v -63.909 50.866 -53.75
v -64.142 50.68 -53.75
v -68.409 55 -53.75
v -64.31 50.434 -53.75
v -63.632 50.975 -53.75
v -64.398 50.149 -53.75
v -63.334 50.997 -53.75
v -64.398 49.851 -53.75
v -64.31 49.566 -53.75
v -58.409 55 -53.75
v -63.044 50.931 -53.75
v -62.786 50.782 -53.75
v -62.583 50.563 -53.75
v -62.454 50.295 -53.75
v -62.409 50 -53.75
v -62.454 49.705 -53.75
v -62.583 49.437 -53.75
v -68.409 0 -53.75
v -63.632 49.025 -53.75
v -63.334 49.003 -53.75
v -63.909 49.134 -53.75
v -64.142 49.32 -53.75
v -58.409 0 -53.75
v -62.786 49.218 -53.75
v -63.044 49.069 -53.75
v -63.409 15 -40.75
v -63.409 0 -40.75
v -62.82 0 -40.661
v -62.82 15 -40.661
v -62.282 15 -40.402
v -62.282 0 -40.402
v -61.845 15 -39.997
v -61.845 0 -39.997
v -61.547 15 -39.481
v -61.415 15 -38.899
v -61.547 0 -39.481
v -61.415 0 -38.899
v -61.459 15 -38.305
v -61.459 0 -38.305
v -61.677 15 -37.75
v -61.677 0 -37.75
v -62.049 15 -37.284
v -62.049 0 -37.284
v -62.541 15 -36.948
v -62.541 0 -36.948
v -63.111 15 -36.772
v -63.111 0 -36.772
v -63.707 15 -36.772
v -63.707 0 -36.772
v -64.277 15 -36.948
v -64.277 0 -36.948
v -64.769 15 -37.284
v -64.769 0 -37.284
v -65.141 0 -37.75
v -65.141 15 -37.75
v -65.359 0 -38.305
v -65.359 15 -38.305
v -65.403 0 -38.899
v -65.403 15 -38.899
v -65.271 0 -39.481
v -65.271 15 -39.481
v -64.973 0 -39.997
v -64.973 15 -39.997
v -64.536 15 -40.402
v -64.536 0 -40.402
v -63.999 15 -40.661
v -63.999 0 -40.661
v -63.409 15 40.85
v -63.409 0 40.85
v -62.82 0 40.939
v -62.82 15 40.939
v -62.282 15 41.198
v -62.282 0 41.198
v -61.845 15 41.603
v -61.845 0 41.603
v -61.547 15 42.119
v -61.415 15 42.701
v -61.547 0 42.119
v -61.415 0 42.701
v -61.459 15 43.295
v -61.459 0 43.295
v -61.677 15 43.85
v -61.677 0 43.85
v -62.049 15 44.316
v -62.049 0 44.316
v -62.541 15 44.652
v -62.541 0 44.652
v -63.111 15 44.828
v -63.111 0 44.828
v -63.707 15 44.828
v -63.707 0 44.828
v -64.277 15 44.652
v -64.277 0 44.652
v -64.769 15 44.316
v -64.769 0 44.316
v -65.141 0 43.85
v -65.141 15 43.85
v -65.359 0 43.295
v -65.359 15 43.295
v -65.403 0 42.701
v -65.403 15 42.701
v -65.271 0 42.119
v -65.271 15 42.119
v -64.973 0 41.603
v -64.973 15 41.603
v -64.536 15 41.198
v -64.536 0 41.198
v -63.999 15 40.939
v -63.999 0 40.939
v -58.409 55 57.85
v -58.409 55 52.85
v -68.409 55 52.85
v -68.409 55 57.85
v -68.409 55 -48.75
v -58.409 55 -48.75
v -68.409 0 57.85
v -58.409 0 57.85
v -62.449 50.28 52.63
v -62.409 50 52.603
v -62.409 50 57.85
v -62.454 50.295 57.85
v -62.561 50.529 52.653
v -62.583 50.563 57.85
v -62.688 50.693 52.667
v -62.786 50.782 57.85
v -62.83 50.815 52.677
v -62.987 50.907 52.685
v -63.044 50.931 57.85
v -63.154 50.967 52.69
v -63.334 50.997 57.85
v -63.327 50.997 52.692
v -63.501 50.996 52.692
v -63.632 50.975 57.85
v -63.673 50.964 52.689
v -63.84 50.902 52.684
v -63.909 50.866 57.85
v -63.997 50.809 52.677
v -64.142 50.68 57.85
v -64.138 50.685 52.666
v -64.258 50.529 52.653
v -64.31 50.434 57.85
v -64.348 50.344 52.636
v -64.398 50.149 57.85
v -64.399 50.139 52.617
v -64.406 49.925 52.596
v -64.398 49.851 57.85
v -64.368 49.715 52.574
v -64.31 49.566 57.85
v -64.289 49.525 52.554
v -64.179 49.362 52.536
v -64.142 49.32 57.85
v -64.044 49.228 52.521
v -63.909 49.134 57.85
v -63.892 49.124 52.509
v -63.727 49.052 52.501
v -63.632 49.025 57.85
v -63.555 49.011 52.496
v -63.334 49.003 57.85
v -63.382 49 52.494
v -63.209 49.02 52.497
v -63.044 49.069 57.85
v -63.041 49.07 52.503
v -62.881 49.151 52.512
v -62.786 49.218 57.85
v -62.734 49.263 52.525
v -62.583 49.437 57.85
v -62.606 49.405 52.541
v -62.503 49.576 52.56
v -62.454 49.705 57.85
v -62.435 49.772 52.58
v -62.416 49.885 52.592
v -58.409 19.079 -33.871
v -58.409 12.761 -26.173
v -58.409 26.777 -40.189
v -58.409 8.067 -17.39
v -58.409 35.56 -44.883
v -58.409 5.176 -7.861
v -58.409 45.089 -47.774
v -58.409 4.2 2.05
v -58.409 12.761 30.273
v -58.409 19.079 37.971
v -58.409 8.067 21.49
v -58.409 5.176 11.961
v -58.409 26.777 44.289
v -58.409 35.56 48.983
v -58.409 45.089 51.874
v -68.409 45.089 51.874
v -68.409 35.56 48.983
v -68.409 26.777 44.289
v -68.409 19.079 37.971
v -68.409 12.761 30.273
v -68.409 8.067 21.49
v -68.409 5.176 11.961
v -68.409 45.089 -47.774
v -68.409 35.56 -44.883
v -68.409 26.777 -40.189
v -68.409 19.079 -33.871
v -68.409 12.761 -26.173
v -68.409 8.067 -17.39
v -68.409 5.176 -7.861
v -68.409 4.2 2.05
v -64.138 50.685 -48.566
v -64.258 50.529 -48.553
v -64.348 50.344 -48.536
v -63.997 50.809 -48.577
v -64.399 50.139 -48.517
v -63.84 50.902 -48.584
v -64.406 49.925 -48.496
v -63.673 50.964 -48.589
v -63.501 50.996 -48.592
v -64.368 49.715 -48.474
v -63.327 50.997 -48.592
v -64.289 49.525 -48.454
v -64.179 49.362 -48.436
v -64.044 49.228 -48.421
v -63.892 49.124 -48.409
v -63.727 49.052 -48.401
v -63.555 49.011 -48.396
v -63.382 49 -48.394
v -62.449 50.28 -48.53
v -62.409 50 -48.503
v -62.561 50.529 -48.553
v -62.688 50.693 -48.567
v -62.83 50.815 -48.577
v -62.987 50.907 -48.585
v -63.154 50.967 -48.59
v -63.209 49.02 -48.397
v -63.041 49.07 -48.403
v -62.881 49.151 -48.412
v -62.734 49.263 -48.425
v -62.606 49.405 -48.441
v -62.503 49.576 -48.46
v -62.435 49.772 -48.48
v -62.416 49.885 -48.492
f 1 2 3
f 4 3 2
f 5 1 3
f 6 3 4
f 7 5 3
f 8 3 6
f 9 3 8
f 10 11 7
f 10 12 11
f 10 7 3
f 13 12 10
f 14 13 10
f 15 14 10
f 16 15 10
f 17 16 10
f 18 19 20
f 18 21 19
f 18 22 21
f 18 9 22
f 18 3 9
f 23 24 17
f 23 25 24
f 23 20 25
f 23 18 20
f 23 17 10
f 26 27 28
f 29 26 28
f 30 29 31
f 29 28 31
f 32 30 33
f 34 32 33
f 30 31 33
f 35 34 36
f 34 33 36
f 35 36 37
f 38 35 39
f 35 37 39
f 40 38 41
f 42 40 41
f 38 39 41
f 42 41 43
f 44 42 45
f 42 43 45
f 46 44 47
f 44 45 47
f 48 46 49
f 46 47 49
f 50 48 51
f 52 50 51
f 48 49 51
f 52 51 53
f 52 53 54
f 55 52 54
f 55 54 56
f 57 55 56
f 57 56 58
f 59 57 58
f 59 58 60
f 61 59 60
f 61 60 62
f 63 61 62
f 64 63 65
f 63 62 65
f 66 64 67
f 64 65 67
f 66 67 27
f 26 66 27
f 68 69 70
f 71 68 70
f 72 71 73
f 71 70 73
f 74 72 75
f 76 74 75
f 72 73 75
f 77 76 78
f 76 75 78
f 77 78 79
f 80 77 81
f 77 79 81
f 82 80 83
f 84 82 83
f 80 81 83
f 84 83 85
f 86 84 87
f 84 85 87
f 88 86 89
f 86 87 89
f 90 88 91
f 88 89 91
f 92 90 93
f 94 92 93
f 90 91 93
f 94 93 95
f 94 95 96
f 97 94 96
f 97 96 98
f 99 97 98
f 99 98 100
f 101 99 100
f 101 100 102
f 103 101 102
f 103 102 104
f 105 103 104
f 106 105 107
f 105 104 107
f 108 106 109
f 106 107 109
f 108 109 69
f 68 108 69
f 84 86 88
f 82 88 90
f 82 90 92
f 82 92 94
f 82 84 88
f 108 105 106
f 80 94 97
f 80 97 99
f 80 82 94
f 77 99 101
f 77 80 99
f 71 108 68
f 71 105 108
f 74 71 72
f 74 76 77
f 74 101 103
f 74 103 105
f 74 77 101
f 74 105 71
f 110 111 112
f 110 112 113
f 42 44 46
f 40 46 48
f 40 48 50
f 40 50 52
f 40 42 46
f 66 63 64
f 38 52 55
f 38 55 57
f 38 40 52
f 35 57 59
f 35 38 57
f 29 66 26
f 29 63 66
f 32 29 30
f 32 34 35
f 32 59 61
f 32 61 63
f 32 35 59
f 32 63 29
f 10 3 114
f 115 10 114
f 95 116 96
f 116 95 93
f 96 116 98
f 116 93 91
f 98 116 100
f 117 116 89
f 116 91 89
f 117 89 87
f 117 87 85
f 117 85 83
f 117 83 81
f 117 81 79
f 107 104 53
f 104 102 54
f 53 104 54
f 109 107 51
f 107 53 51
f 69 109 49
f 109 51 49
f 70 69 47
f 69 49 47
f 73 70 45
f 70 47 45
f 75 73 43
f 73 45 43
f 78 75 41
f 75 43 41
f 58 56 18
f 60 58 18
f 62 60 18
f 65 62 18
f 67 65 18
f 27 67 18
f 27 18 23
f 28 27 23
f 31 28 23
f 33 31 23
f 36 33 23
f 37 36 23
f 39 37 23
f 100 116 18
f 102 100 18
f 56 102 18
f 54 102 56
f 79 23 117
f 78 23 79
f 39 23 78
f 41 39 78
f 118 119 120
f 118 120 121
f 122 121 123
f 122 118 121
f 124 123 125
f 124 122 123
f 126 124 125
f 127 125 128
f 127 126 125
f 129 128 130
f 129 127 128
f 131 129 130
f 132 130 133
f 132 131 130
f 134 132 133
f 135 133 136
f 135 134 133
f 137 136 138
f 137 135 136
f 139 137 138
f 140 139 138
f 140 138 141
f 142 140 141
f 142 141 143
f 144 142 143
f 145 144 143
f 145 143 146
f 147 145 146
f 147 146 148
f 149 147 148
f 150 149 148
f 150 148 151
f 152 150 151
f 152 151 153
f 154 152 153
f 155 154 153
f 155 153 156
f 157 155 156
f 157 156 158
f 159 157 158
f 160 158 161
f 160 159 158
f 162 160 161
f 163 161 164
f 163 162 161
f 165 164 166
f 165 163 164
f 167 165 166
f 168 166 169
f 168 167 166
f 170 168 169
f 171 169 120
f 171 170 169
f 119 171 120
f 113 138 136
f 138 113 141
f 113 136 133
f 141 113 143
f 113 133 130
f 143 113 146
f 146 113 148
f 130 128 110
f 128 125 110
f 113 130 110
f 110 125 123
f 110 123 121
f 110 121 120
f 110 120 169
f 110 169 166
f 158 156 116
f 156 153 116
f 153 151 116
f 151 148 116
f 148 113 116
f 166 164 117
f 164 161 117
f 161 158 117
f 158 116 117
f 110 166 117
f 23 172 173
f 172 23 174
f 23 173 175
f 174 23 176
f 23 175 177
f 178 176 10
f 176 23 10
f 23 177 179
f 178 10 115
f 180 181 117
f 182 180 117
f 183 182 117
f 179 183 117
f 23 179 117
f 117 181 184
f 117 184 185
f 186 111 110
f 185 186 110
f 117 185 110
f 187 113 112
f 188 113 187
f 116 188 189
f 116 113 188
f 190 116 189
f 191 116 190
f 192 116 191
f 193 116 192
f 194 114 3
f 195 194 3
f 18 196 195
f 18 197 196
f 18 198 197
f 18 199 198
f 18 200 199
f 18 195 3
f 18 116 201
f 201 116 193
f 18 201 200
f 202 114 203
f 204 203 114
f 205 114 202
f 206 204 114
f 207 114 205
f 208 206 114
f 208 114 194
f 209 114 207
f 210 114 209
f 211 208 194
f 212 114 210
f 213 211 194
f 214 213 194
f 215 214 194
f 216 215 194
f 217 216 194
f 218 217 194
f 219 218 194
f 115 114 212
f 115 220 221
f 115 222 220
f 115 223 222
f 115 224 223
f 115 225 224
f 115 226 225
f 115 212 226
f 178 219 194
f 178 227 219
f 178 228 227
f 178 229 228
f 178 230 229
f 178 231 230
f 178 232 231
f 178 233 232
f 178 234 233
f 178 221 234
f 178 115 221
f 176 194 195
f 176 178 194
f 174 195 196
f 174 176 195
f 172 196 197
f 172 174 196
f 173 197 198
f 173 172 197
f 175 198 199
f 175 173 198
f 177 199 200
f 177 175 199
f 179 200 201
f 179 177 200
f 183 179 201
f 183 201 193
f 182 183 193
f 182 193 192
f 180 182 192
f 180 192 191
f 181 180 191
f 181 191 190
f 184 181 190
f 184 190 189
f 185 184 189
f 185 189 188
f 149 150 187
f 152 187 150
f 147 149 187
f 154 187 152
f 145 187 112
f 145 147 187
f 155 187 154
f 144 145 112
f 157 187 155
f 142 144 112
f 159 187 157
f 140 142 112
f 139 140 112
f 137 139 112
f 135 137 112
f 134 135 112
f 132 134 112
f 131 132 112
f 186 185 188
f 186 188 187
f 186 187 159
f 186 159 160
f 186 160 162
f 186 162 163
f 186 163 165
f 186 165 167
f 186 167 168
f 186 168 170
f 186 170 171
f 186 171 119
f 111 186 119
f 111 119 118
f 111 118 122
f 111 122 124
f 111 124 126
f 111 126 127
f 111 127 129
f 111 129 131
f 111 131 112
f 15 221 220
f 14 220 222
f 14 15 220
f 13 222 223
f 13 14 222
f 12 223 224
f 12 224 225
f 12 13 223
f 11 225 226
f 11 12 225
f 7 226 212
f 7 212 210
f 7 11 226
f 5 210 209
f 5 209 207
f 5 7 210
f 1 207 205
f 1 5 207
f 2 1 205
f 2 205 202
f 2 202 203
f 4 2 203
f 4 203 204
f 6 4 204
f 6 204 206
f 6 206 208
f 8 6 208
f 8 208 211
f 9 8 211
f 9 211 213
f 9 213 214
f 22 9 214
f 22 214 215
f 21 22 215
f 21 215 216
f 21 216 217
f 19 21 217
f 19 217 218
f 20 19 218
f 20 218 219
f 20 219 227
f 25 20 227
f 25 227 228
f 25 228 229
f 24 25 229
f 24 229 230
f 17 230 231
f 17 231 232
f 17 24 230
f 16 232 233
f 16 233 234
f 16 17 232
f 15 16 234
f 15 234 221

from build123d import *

# Parameters (mm, degrees)
SKETCH1_W               = 189.5
SKETCH1_H               = 111.6
BOSS_EXTRUDE1_DEPTH     = 80
SKETCH3_R               = 8.15
CUT_EXTRUDE2_DEPTH      = 40
SKETCH4_R               = 10.3
CUT_EXTRUDE3_DEPTH      = 40
CUT_EXTRUDE1_DEPTH      = 214.674688487
CUT_EXTRUDE5_START      = -10
SKETCH5_R               = 83.637561864
CUT_EXTRUDE5_DEPTH      = 196.625563976
SKETCH6_R               = 2
CUT_EXTRUDE6_DEPTH      = 15
CUT_EXTRUDE7_DEPTH      = 142.983674128
CUT_EXTRUDE7_DEPTH_BACK = 142.983674128
SKETCH7_R               = 1


with BuildPart() as part:
    # Sketch1 → Boss-Extrude1 (new body)
    with BuildSketch(Plane(origin=(0, 0, 0), x_dir=(1, 0, 0), z_dir=(0, 1, 0))):
        with Locations((26.340909091, -2.05)):
            Rectangle(SKETCH1_W, SKETCH1_H)
    extrude(amount=BOSS_EXTRUDE1_DEPTH)

    # Sketch3 → Cut-Extrude2 (cut)
    with BuildSketch(Plane.XY.offset(57.85)):
        with Locations((-6.709090909, 45)):
            Circle(SKETCH3_R)
        with Locations((44.290909091, 45)):
            Circle(SKETCH3_R)
        with Locations((95.290909091, 45)):
            Circle(SKETCH3_R)
    extrude(amount=-CUT_EXTRUDE2_DEPTH, mode=Mode.SUBTRACT)

    # Sketch4 → Cut-Extrude3 (cut)
    with BuildSketch(Plane(origin=(0, 0, -53.75), x_dir=(-1, 0, 0), z_dir=(0, 0, -1))):
        with Locations((-18.790909091, 45)):
            Circle(SKETCH4_R)
    extrude(amount=-CUT_EXTRUDE3_DEPTH, mode=Mode.SUBTRACT)

    # Sketch2 → Cut-Extrude1 (cut, through all)
    with BuildSketch(Plane.ZY.offset(68.409090909)):
        with BuildLine():
            Line((-53.75, 80), (-53.75, 55))
            Line((-53.75, 55), (-48.75, 55))
            ThreePointArc((-48.75, 55), (2.05, 4.2), (52.85, 55))
            Line((52.85, 55), (57.85, 55))
            Line((57.85, 55), (57.85, 80))
            Line((57.85, 80), (-53.75, 80))
        make_face()
    extrude(amount=-CUT_EXTRUDE1_DEPTH, mode=Mode.SUBTRACT)

    # Sketch5 → Cut-Extrude5 (cut, through all)
    with BuildSketch(Plane.ZY.offset(68.409090909).offset(CUT_EXTRUDE5_START)):
        with Locations((5.899408019, 41.151011042)):
            Circle(SKETCH5_R)
    extrude(amount=-CUT_EXTRUDE5_DEPTH, mode=Mode.SUBTRACT)

    # Sketch6 → Cut-Extrude6 (cut)
    with BuildSketch(Plane.XZ):
        with Locations((-63.409090909, 42.85)):
            Circle(SKETCH6_R)
        with Locations((-63.409090909, -38.75)):
            Circle(SKETCH6_R)
    extrude(amount=-CUT_EXTRUDE6_DEPTH, mode=Mode.SUBTRACT)

    # Sketch7 → Cut-Extrude7 (cut, two sides: drawn at the far end of the back side and taken through both)
    with BuildSketch(Plane.XY.offset(57.85).offset(-CUT_EXTRUDE7_DEPTH_BACK)):
        with Locations((-63.409090909, 50)):
            Circle(SKETCH7_R)
    extrude(amount=CUT_EXTRUDE7_DEPTH + CUT_EXTRUDE7_DEPTH_BACK, mode=Mode.SUBTRACT)


solid = part.part
